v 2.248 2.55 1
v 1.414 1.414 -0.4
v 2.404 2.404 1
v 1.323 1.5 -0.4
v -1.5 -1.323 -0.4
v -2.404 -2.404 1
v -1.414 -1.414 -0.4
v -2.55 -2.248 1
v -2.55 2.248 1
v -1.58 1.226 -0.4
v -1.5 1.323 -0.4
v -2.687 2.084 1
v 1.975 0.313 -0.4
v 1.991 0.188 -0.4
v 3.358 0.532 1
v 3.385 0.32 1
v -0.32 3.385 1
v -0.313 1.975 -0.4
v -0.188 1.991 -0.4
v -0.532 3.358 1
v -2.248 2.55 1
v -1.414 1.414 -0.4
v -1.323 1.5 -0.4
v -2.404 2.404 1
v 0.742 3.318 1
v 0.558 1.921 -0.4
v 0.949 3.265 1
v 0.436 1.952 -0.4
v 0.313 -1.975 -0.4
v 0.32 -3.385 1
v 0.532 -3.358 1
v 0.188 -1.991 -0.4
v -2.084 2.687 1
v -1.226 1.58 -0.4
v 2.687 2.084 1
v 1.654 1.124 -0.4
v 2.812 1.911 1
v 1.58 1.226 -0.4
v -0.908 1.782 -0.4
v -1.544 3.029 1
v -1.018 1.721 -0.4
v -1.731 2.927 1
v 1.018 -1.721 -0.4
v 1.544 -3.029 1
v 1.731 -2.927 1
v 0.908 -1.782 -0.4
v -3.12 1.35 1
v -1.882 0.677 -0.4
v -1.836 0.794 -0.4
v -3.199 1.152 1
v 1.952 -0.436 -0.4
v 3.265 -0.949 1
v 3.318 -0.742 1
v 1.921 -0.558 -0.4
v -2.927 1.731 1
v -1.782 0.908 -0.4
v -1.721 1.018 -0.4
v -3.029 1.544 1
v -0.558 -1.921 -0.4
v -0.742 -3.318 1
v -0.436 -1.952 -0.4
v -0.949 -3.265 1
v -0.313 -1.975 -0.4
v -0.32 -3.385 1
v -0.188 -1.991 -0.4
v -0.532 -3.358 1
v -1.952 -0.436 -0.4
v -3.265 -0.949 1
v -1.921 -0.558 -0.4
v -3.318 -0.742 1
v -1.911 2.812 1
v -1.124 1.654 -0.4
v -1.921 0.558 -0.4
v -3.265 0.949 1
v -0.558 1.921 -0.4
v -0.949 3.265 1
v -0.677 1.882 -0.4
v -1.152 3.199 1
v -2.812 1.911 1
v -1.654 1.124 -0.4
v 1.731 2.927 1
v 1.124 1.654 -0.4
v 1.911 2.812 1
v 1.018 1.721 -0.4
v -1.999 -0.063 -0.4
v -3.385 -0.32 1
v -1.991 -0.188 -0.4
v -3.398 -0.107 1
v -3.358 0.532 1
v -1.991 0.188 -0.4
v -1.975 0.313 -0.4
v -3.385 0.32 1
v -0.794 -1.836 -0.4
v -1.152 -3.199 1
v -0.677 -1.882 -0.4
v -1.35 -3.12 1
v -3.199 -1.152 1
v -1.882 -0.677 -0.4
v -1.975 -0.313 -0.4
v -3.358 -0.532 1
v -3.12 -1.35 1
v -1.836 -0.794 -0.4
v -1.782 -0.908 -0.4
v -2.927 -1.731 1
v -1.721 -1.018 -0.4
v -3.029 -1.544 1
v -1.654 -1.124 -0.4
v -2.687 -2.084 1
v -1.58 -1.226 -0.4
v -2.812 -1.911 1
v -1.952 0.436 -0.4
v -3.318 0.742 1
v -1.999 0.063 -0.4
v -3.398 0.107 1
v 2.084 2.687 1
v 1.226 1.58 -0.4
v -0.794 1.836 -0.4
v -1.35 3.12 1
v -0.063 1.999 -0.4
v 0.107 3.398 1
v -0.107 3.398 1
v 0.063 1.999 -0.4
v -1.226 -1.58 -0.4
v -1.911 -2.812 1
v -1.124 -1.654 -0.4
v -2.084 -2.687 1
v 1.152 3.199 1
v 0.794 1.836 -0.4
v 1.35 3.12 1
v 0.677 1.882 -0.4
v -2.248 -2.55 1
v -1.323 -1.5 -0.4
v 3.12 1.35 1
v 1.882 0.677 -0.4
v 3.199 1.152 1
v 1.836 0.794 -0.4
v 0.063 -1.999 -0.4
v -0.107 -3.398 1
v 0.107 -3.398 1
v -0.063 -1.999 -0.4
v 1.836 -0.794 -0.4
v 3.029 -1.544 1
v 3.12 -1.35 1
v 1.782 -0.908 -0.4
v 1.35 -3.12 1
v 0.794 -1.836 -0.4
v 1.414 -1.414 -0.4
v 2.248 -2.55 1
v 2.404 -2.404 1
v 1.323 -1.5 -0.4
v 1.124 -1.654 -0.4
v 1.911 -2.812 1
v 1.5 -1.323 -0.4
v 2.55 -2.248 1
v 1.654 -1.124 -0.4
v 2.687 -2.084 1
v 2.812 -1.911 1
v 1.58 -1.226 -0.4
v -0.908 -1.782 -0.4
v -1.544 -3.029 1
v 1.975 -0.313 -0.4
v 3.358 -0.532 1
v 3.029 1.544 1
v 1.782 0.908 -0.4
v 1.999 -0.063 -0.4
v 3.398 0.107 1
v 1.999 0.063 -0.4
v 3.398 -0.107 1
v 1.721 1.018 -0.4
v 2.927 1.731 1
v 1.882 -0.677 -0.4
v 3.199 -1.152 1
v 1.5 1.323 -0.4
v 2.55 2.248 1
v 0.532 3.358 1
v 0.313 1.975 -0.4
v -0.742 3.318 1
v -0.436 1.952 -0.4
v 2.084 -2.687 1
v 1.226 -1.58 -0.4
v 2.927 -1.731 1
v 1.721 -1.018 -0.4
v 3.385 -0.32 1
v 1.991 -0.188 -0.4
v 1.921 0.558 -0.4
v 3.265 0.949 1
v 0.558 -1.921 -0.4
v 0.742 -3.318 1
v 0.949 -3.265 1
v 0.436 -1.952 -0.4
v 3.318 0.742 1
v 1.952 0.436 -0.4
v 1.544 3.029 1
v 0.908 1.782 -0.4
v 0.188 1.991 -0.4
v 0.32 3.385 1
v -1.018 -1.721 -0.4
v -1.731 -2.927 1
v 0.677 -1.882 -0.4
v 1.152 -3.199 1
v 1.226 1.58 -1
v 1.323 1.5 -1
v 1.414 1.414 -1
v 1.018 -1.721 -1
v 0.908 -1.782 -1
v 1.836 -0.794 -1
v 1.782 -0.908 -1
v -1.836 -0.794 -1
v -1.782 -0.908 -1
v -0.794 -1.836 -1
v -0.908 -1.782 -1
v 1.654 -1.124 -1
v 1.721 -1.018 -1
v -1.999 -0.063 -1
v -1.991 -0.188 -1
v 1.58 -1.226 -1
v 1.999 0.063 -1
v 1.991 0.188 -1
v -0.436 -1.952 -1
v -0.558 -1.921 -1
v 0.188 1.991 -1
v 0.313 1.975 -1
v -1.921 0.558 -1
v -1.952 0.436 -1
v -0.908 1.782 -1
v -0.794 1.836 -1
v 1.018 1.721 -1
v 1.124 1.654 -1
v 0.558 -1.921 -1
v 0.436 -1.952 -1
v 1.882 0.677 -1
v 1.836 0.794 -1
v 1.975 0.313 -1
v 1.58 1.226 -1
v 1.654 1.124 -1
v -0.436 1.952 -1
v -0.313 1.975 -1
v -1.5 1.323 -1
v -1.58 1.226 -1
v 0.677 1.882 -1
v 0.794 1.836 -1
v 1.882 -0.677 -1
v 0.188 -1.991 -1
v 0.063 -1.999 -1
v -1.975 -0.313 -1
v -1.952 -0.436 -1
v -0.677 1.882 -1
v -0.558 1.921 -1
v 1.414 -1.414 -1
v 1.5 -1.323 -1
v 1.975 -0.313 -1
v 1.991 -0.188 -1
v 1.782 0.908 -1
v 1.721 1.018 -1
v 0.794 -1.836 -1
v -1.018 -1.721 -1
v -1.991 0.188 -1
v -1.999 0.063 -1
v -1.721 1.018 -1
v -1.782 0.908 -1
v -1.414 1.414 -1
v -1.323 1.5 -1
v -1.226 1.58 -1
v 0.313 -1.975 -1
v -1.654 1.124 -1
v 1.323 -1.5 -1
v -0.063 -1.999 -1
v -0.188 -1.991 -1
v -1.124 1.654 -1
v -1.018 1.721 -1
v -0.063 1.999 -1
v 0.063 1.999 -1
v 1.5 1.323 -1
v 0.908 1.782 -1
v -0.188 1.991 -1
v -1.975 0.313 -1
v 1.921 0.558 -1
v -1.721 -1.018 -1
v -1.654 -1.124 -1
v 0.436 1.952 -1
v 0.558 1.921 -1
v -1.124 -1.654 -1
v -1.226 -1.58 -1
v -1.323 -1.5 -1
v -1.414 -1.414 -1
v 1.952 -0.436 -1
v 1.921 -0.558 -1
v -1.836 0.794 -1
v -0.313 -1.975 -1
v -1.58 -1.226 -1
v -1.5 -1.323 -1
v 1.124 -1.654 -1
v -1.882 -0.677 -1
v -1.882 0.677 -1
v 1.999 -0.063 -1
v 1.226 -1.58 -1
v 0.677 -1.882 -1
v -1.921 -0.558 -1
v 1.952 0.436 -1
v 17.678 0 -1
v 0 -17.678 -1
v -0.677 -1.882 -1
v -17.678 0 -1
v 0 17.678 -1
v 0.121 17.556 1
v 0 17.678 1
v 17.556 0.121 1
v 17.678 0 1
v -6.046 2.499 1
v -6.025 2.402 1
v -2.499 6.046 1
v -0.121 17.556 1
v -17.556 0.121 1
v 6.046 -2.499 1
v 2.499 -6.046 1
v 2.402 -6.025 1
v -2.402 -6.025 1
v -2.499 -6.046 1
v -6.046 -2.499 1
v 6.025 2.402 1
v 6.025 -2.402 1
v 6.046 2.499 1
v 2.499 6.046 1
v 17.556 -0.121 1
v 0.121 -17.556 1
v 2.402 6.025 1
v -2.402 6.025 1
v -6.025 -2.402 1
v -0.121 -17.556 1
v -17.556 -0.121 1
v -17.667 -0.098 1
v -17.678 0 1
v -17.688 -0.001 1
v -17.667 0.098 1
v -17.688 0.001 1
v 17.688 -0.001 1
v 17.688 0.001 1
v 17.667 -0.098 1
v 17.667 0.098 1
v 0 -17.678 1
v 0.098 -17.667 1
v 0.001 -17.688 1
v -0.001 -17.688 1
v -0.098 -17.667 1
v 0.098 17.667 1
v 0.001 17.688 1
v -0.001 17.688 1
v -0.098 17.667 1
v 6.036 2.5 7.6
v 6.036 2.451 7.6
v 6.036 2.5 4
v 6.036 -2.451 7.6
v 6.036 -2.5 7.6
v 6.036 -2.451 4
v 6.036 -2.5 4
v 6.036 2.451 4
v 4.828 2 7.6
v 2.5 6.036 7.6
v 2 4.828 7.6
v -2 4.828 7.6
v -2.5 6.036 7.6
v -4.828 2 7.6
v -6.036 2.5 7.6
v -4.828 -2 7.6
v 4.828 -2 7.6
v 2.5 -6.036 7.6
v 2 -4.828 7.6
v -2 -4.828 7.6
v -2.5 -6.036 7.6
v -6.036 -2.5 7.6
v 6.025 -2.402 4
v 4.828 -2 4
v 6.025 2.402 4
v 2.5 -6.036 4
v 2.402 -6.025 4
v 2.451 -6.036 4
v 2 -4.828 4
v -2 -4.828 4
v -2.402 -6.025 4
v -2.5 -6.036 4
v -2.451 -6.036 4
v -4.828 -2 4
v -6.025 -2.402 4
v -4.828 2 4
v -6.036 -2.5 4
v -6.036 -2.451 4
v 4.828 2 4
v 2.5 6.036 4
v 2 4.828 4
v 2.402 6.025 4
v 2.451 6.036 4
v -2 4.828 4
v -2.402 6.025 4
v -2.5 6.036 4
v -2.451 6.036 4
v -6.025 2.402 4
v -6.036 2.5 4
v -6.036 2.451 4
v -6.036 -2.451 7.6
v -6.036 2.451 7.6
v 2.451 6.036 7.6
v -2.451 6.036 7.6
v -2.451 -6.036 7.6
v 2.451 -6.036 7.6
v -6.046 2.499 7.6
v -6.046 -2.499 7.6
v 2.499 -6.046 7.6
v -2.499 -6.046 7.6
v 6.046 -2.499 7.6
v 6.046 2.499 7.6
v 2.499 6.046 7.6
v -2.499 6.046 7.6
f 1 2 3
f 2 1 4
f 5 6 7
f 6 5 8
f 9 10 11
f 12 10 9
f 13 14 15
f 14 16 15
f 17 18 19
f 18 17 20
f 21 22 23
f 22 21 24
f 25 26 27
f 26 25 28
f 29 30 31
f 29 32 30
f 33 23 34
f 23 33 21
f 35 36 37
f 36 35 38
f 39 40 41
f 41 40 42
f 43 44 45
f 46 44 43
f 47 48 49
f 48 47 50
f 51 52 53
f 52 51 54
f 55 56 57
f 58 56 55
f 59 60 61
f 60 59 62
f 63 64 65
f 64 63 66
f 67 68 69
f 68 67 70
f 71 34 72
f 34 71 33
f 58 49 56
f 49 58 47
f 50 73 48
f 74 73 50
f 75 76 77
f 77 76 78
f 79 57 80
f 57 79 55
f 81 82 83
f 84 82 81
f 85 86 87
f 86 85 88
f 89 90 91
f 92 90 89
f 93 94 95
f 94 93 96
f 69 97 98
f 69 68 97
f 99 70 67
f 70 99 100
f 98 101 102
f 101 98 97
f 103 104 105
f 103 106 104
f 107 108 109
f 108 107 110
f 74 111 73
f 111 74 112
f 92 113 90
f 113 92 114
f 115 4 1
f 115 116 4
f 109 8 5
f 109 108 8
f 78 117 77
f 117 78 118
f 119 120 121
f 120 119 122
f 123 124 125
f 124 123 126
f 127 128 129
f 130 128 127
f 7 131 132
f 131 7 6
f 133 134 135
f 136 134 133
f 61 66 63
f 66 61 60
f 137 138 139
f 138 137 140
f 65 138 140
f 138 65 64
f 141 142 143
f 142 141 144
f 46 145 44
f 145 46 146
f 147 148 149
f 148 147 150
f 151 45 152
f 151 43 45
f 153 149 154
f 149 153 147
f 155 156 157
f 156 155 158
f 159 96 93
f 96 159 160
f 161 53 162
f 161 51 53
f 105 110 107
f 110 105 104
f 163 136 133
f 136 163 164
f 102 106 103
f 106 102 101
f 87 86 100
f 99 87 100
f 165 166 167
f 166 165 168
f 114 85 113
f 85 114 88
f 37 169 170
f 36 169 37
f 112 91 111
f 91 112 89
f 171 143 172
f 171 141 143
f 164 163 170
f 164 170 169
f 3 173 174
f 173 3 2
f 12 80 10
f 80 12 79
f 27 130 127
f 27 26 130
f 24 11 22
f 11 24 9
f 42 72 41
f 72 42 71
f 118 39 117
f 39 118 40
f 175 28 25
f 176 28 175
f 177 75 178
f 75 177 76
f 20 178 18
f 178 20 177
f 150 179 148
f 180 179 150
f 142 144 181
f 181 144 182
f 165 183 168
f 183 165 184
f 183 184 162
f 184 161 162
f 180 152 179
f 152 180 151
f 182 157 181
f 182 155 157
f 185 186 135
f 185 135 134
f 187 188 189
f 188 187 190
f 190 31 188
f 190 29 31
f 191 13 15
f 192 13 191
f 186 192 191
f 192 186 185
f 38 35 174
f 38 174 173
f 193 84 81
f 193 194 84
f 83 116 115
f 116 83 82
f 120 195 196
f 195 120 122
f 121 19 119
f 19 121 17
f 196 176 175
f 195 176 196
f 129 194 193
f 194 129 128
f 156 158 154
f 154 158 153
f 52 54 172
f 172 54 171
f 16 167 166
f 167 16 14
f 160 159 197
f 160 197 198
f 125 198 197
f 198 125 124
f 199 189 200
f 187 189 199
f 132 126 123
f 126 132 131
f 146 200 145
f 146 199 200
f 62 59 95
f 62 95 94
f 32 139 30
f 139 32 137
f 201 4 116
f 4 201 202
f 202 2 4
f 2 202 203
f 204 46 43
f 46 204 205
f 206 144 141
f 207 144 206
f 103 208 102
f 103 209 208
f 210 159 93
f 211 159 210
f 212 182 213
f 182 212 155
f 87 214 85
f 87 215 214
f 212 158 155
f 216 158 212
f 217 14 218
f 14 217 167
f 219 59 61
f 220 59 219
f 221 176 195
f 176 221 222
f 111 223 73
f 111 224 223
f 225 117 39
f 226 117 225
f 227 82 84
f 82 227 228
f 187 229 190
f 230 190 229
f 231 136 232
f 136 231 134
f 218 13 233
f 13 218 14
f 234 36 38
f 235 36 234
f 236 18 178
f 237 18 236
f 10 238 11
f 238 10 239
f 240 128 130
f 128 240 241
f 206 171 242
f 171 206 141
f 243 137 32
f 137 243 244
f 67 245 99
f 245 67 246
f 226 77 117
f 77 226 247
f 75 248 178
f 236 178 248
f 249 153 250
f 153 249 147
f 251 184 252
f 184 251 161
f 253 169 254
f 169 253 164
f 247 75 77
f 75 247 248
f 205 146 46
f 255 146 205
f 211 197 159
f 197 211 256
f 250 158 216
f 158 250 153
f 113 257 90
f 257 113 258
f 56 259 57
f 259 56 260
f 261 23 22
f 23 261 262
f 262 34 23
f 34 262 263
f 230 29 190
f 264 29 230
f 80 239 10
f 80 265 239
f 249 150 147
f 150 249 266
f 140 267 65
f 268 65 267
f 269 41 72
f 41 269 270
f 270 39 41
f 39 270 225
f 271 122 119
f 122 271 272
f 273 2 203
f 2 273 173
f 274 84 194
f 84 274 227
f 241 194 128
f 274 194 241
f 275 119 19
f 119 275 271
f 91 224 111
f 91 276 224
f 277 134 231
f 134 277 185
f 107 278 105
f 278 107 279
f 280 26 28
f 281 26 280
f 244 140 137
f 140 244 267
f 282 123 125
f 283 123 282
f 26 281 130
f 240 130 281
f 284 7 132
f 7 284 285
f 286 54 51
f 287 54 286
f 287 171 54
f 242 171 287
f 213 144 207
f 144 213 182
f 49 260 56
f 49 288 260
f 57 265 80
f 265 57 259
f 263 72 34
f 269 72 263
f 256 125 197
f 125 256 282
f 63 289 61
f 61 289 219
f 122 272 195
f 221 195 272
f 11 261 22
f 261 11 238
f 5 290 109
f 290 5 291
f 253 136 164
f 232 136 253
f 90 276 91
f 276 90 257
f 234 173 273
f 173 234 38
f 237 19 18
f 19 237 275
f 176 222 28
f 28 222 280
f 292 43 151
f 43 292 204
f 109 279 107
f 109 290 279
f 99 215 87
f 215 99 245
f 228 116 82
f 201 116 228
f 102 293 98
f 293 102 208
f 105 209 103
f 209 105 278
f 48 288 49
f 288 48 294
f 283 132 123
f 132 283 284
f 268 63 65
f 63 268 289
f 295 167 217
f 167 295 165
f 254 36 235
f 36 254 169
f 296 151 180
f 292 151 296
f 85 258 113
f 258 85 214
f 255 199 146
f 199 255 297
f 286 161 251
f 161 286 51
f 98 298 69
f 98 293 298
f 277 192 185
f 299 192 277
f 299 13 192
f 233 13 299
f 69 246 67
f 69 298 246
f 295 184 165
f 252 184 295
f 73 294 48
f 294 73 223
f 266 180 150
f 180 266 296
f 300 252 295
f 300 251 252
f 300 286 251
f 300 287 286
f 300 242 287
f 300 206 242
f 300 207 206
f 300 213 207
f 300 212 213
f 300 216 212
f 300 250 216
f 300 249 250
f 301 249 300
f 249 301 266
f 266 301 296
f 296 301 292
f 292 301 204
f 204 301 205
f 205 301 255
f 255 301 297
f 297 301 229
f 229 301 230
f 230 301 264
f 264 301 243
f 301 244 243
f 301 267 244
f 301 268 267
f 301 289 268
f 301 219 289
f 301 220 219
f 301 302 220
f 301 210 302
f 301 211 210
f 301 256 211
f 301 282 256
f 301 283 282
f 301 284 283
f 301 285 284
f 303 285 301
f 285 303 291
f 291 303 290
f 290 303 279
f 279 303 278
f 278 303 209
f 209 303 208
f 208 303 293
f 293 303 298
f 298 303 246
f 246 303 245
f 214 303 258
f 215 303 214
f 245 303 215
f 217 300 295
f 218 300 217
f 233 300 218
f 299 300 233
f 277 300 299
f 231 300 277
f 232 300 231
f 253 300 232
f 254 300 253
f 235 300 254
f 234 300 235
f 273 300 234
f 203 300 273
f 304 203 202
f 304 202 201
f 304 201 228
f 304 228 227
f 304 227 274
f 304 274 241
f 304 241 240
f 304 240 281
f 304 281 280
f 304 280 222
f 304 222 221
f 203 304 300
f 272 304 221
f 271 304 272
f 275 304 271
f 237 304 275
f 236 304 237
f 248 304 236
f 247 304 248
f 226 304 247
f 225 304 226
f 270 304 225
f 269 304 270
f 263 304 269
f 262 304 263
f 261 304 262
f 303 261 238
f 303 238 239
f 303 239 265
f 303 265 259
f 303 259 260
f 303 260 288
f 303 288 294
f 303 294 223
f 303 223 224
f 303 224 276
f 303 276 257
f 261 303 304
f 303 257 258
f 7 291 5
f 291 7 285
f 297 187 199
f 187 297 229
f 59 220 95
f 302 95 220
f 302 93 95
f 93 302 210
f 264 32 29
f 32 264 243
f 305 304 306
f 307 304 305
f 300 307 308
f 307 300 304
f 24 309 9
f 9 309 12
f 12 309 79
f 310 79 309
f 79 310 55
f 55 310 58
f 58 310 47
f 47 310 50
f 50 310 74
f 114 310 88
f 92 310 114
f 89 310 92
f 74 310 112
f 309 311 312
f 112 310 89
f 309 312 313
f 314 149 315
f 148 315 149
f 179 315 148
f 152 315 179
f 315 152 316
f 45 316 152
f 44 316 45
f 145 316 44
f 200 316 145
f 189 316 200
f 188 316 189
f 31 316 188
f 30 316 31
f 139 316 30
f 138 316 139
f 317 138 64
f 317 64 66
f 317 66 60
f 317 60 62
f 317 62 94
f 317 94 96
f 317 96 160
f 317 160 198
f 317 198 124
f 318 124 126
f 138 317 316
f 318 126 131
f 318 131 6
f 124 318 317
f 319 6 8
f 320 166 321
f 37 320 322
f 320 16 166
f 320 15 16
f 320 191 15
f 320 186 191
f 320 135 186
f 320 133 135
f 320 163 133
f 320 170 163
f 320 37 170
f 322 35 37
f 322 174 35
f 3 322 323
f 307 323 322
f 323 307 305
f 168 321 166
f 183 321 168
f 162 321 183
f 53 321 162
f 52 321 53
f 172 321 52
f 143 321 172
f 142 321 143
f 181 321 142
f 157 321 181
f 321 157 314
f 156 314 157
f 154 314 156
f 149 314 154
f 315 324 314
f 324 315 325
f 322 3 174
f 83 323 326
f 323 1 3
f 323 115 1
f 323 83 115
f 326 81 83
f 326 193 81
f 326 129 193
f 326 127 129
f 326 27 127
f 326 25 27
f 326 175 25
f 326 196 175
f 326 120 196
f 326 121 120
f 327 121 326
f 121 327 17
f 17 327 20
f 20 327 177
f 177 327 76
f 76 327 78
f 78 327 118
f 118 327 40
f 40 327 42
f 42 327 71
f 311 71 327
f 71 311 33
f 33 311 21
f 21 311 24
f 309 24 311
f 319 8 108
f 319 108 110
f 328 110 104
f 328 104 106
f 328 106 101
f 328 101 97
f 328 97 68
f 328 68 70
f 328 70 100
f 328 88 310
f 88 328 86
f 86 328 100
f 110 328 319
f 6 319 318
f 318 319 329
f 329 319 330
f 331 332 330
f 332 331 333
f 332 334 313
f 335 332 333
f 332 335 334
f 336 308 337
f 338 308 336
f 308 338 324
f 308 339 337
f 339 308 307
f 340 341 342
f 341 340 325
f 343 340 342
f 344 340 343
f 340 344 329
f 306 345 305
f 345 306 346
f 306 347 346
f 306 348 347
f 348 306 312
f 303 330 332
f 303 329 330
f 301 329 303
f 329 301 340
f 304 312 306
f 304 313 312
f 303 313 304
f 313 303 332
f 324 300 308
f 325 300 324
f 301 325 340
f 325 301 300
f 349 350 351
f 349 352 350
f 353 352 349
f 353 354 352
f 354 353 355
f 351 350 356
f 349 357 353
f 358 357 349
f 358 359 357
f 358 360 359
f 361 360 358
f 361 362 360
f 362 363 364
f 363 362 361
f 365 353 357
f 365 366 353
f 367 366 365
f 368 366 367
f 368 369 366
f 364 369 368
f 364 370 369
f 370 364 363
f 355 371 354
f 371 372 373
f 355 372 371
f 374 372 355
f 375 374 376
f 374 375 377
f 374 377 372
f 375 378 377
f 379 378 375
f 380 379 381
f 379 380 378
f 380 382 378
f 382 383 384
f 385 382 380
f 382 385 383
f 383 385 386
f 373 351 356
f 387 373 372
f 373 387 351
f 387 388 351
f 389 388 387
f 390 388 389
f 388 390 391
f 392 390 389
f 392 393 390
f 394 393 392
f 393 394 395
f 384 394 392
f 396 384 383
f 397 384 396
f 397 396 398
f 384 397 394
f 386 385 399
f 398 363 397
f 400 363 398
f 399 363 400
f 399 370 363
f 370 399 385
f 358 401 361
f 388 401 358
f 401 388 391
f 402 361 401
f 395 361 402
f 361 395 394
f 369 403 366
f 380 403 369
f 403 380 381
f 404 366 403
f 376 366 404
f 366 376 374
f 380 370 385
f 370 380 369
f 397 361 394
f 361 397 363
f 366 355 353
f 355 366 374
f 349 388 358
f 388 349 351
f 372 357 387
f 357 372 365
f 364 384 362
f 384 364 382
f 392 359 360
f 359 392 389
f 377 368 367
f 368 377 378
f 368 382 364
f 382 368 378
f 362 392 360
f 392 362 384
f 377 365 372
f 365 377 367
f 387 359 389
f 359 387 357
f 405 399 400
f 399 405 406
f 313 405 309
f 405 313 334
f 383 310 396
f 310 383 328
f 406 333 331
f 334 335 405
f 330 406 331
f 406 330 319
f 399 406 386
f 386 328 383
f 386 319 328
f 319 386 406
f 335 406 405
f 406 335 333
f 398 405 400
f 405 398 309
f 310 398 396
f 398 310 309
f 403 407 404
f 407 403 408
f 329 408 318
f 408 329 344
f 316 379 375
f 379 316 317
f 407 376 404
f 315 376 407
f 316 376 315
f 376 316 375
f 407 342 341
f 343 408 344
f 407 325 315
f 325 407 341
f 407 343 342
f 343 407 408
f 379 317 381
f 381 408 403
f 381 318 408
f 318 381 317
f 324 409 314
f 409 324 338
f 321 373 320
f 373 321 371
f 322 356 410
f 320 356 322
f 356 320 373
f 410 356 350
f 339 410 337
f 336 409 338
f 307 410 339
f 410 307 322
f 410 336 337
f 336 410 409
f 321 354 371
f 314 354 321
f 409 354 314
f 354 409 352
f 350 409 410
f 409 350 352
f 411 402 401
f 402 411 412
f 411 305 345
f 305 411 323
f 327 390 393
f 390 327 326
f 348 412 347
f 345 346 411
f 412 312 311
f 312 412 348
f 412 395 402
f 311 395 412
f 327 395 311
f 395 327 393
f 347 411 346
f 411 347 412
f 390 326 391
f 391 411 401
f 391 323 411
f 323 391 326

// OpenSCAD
// Amy and Brian Palmer 2019. Some Customizer usage ideas from nick finger (http://www.thingiverse.com/thing:1340624)
/* [Zip Tie Down holder ] */
// V2.0 4/11/19 added mounting hole hole
// V2.1 4/12/19 added options for closed/open top, screw sizes, and improved hole bevel placement.
// V2.2 4/12/19 - modified the customizer settingd mostly
// V2.3 Removed scaling feature. That was stupid. Added first circle fixture.

//Choose which part to create. 
part = 1; //[ 1:Base, 2: Circle Fixture, 3: Square Fixture, 4: Pipe Fixture]  
//Enable to preview all parts together!  KEEP THIS OFF in order to create individual printable parts.
previewMode = 0; //[0:Print Mode, 1:Preview Mode (dont print!)]
// preview[view:south, tilt:top diagonal]
//Select Exploded Mode to view your selected part and the base seperated. Or connected to see how they looked when snapped together.  Only relevant when in Preview Mode.
explodedView = 0; //[0:Exploded View,1:Connected View] 
/* [mounting Hole Options] */

mountingHole=1;     // [0:no, 1:helz ya!]
screwSize=1;        // [0:small,1:medium,2:large]
screwType=1;        // [1:beveled,0:flat]
screwBevelAngle=90; // [50:degrees,90:90 degrees,80:80 degrees,100:100 degrees]


/* [Even More Options] */
// Always open when Mounting Hole option is Yes.
openORClosedTop=0;  // [1:open, 0:closed] 
// Width of zip tie plus a little clearance.
zipTieWidth=5;     // [1:40]
// Width of the base mounting pad.
baseWidth=25;       // [5:100]

// Overall Height of mount
overallHeight=8.6;       // [3:90]
// Height of the zip tie plus a little clearance.
zipTieHeight=3;    // [0:80]
// Thickness of base mounting pad.
baseHeight=2;       // [1:88]


/* [Hidden] */
$fn=100;

bw=baseWidth;
bHeight=baseHeight;
ztWidth=zipTieWidth;
oHeight=overallHeight;
ztHeight=zipTieHeight;
//ztHeightAdj= ztHeight < oHeight-bHeight ?  c:oHeight-bHeight-1;
ztHeightAdj = ztHeight;

// apply contraints
oHeightAdj = oHeight < ztHeightAdj + bHeight ? ztHeightAdj + bHeight + 4: oHeight;
bHeightAdj = bHeight < ztHeight + 4 ? bHeight : ztHeight + 4;

hubHeight=oHeightAdj-(ztHeightAdj+bHeight);
lHeight=oHeightAdj-bHeight;

totalHeight = bHeight+lHeight;
hHeight = hubHeight > totalHeight ? totalHeight : hubHeight;
// hole settings
scrwHeadDiam  = screwSize==0 ? 4 : screwSize==1 ? 8 : 10;
scrwShaftDiam = screwSize==0 ? 2 : screwSize==1 ? 4 : 5;
screwHeadDiam = scrwHeadDiam;
screwShaftDiam = scrwShaftDiam;
holeBevelAngle = screwBevelAngle/2;

// go Amy go
octDiam = (1 + sqrt(2))*ztWidth;
bWidth = bw < octDiam ? octDiam : bw; 
legLen = (sqrt(2)*bWidth-octDiam)/2;
hypotenuse = sqrt(pow((ztWidth/2),2)+pow(legLen,2));
rotateAngle = asin((ztWidth/2)/hypotenuse);
holeDiam = screwHeadDiam > octDiam ? octDiam : screwHeadDiam;
holeBevelConeHeight = tan(holeBevelAngle)*(holeDiam/2);

main();

module main(){
    
    if(previewMode == 1){
		generate_preview();
	} else { //PRINT MODE!
		
		// Base section
		if (part == 1){
            make_base();
        } else {
        rotate([180,0,0]){ 
            make_Fixture();
        }
        }
    }

}

module make_Fixture() {
    // Circle Fixture
    if (part == 2){
        make_circleFixture(octDiam, hHeight, bWidth);
    }
    
    // Square Fixture
    if (part == 3){
        make_SquareFixture(octDiam, hHeight, bWidth);
    }
    
    // Pipe Fixture
    if (part == 4){
        make_PipeFixture(octDiam, hHeight, bWidth);
    }
}

module generate_preview() {
    make_base();
    zAdj = explodedView == 0 ? totalHeight + 10 : totalHeight;
    translate([0,0,zAdj]) {
        rotate([180,0,0]){ 
            make_Fixture();          
        }
    }
}


module make_base(){
    // base
    rotate(45)
    {
        difference() 
        {
            // base
            cube([bWidth,bWidth,bHeight], true);
            
            // mounting hole
            union() {
                if (mountingHole == 1)
                {
                    // screw hole
                    cylinder(h=bHeight, d1=screwShaftDiam, d2=screwShaftDiam, center=true);
                    if (screwType==1) { // beveled
                        // move to bottom of base and up a tad
                        n=holeBevelConeHeight*.65;
                        centerOfHoleBevelHole=-((bHeight/2)+(holeBevelConeHeight/2)-(n));
                        translate([0,0,centerOfHoleBevelHole]) 
                        {
                            cylinder(h=holeBevelConeHeight, d1=0, d2=holeDiam, center=true);
                        }
             
                        translate([0,0,n]) 
                        {
                            // access hole
                            cylinder(h=bHeight, d1=holeDiam, d2=holeDiam, center=true);
                        }
                    }
                }
            }
        }
    }
    
    // hub
    translate([0,0,(bHeight/2) + lHeight - (hHeight/2)])
    {
        difference() 
        {
            octogon(octDiam, hHeight);
            if (mountingHole == 1 || openORClosedTop == 1)
            {
                octogon(octDiam-(octDiam*.20), hHeight);
            }
        }
    }
    
    // make 4 legs
    for (a =[1:4]) 
        { 
            rotate(90*a) { 
            leg(ztWidth);
        }
    }
}

module leg(width) {
    hull() 
    {
       legSide(width-.099,rotateAngle);
       legSide(-width+.099,-rotateAngle);
//       legSide(width,rotateAngle);
//       legSide(-width,-rotateAngle);
    }
}

module legSide(hw,ra) {
    translate([hw/2,octDiam/2,bHeight/2]) {
        rotate(ra) {
            createBrace(lHeight,hypotenuse,.1);
        }
    }
}

module createBrace(height, width, thickness) {
    triangle = [[0, 0],[height, 0],[0, width]]; 
    rotate([0,-90,0])
    {
        linear_extrude(height = thickness, center = true, convexity = 10, twist = 0, slices = 1, scale = 1, $fn = 20) 
        { 
            polygon(triangle);
        }
        
    }
}

module octogon(diameter, height) {
    
    difference() 
    {
         cube([diameter,diameter,height], true);
         difference() 
         {
            cube([diameter,diameter,height], true);
            rotate(45)
            {
                cube([diameter,diameter,height], true);
            }
        }
    }
}

module make_circleFixture(diam, height, baseDiam) {
    partClearance=.01;
    plateHeight=2;

    difference() {
        // plate
        cylinder(h=plateHeight, d1=baseDiam, d2=baseDiam, center=true);
        rotate(45){
        zipTieHoles();
        }
    }
    
    // stem
    translate([0,0, (height/2)+(plateHeight/2)]) {
        octogon(diam-(diam*(.20 + partClearance)), height);
    }
}

module make_SquareFixture(diam, height, baseDiam) {
    heightAdj = height < 4 ? height : 4;
    partClearance=.01;
    plateHeight=2;
    holeOffset=octDiam/2+ztHeight/2;
    plateDiam=(octDiam+ztHeight)*1.8;
 
    rotate(45) {
        difference() {
            // base plate
            cube([plateDiam,plateDiam,plateHeight], true);
            union() {
                zipTieHoles();
                rotate(90) {
                    zipTieHoles();
                }
            }
        }
    }
    
    // stem;       
    translate([0,0, (heightAdj/2)+(plateHeight/2)]) {
        octogon(diam-(diam*(.20 + partClearance)), heightAdj);
    }
}  



module make_PipeFixture(diam, height, baseDiam) {
    heightAdj = height < 4 ? height : 4;
    partClearance=.01;
    plateHeight=2;
    holeOffset=octDiam/2+ztHeight/2;
    plateDiam=(octDiam+ztHeight)*1.8;
 
    rotate(45) {
        difference() {
            // base plate
            cube([plateDiam,plateDiam,plateHeight], true);
            union() {
                zipTieHoles();
            }
        }
        translate([0,0,-(plateHeight/2)-2.5]) {
            difference() {
                cube([15,plateDiam,5], true);
                translate([0,0,-8]) {
                    rotate([90,90]){
                        cylinder(h=100, d1=18, d2=18, center=true);
                    }
                }
            }
        }
    }
    
    // stem;       
    translate([0,0, (heightAdj/2)+(plateHeight/2)]) {
        octogon(diam-(diam*(.20 + partClearance)), heightAdj);
    }
}  

module zipTieHoles() {
    // zip tie holes
    union(){
        holeOffsetOffset=2; // to allow room fo ziptie to bend around corner
        holeOffset=(octDiam/2+ztHeight/2)+holeOffsetOffset;
        translate([holeOffset,0,0]) {
          cube([ztHeight,ztWidth,10], true);
        }
        translate([-holeOffset,0,0]) {
          cube([ztHeight,ztWidth,2], true);
        } 
    }   
}               
